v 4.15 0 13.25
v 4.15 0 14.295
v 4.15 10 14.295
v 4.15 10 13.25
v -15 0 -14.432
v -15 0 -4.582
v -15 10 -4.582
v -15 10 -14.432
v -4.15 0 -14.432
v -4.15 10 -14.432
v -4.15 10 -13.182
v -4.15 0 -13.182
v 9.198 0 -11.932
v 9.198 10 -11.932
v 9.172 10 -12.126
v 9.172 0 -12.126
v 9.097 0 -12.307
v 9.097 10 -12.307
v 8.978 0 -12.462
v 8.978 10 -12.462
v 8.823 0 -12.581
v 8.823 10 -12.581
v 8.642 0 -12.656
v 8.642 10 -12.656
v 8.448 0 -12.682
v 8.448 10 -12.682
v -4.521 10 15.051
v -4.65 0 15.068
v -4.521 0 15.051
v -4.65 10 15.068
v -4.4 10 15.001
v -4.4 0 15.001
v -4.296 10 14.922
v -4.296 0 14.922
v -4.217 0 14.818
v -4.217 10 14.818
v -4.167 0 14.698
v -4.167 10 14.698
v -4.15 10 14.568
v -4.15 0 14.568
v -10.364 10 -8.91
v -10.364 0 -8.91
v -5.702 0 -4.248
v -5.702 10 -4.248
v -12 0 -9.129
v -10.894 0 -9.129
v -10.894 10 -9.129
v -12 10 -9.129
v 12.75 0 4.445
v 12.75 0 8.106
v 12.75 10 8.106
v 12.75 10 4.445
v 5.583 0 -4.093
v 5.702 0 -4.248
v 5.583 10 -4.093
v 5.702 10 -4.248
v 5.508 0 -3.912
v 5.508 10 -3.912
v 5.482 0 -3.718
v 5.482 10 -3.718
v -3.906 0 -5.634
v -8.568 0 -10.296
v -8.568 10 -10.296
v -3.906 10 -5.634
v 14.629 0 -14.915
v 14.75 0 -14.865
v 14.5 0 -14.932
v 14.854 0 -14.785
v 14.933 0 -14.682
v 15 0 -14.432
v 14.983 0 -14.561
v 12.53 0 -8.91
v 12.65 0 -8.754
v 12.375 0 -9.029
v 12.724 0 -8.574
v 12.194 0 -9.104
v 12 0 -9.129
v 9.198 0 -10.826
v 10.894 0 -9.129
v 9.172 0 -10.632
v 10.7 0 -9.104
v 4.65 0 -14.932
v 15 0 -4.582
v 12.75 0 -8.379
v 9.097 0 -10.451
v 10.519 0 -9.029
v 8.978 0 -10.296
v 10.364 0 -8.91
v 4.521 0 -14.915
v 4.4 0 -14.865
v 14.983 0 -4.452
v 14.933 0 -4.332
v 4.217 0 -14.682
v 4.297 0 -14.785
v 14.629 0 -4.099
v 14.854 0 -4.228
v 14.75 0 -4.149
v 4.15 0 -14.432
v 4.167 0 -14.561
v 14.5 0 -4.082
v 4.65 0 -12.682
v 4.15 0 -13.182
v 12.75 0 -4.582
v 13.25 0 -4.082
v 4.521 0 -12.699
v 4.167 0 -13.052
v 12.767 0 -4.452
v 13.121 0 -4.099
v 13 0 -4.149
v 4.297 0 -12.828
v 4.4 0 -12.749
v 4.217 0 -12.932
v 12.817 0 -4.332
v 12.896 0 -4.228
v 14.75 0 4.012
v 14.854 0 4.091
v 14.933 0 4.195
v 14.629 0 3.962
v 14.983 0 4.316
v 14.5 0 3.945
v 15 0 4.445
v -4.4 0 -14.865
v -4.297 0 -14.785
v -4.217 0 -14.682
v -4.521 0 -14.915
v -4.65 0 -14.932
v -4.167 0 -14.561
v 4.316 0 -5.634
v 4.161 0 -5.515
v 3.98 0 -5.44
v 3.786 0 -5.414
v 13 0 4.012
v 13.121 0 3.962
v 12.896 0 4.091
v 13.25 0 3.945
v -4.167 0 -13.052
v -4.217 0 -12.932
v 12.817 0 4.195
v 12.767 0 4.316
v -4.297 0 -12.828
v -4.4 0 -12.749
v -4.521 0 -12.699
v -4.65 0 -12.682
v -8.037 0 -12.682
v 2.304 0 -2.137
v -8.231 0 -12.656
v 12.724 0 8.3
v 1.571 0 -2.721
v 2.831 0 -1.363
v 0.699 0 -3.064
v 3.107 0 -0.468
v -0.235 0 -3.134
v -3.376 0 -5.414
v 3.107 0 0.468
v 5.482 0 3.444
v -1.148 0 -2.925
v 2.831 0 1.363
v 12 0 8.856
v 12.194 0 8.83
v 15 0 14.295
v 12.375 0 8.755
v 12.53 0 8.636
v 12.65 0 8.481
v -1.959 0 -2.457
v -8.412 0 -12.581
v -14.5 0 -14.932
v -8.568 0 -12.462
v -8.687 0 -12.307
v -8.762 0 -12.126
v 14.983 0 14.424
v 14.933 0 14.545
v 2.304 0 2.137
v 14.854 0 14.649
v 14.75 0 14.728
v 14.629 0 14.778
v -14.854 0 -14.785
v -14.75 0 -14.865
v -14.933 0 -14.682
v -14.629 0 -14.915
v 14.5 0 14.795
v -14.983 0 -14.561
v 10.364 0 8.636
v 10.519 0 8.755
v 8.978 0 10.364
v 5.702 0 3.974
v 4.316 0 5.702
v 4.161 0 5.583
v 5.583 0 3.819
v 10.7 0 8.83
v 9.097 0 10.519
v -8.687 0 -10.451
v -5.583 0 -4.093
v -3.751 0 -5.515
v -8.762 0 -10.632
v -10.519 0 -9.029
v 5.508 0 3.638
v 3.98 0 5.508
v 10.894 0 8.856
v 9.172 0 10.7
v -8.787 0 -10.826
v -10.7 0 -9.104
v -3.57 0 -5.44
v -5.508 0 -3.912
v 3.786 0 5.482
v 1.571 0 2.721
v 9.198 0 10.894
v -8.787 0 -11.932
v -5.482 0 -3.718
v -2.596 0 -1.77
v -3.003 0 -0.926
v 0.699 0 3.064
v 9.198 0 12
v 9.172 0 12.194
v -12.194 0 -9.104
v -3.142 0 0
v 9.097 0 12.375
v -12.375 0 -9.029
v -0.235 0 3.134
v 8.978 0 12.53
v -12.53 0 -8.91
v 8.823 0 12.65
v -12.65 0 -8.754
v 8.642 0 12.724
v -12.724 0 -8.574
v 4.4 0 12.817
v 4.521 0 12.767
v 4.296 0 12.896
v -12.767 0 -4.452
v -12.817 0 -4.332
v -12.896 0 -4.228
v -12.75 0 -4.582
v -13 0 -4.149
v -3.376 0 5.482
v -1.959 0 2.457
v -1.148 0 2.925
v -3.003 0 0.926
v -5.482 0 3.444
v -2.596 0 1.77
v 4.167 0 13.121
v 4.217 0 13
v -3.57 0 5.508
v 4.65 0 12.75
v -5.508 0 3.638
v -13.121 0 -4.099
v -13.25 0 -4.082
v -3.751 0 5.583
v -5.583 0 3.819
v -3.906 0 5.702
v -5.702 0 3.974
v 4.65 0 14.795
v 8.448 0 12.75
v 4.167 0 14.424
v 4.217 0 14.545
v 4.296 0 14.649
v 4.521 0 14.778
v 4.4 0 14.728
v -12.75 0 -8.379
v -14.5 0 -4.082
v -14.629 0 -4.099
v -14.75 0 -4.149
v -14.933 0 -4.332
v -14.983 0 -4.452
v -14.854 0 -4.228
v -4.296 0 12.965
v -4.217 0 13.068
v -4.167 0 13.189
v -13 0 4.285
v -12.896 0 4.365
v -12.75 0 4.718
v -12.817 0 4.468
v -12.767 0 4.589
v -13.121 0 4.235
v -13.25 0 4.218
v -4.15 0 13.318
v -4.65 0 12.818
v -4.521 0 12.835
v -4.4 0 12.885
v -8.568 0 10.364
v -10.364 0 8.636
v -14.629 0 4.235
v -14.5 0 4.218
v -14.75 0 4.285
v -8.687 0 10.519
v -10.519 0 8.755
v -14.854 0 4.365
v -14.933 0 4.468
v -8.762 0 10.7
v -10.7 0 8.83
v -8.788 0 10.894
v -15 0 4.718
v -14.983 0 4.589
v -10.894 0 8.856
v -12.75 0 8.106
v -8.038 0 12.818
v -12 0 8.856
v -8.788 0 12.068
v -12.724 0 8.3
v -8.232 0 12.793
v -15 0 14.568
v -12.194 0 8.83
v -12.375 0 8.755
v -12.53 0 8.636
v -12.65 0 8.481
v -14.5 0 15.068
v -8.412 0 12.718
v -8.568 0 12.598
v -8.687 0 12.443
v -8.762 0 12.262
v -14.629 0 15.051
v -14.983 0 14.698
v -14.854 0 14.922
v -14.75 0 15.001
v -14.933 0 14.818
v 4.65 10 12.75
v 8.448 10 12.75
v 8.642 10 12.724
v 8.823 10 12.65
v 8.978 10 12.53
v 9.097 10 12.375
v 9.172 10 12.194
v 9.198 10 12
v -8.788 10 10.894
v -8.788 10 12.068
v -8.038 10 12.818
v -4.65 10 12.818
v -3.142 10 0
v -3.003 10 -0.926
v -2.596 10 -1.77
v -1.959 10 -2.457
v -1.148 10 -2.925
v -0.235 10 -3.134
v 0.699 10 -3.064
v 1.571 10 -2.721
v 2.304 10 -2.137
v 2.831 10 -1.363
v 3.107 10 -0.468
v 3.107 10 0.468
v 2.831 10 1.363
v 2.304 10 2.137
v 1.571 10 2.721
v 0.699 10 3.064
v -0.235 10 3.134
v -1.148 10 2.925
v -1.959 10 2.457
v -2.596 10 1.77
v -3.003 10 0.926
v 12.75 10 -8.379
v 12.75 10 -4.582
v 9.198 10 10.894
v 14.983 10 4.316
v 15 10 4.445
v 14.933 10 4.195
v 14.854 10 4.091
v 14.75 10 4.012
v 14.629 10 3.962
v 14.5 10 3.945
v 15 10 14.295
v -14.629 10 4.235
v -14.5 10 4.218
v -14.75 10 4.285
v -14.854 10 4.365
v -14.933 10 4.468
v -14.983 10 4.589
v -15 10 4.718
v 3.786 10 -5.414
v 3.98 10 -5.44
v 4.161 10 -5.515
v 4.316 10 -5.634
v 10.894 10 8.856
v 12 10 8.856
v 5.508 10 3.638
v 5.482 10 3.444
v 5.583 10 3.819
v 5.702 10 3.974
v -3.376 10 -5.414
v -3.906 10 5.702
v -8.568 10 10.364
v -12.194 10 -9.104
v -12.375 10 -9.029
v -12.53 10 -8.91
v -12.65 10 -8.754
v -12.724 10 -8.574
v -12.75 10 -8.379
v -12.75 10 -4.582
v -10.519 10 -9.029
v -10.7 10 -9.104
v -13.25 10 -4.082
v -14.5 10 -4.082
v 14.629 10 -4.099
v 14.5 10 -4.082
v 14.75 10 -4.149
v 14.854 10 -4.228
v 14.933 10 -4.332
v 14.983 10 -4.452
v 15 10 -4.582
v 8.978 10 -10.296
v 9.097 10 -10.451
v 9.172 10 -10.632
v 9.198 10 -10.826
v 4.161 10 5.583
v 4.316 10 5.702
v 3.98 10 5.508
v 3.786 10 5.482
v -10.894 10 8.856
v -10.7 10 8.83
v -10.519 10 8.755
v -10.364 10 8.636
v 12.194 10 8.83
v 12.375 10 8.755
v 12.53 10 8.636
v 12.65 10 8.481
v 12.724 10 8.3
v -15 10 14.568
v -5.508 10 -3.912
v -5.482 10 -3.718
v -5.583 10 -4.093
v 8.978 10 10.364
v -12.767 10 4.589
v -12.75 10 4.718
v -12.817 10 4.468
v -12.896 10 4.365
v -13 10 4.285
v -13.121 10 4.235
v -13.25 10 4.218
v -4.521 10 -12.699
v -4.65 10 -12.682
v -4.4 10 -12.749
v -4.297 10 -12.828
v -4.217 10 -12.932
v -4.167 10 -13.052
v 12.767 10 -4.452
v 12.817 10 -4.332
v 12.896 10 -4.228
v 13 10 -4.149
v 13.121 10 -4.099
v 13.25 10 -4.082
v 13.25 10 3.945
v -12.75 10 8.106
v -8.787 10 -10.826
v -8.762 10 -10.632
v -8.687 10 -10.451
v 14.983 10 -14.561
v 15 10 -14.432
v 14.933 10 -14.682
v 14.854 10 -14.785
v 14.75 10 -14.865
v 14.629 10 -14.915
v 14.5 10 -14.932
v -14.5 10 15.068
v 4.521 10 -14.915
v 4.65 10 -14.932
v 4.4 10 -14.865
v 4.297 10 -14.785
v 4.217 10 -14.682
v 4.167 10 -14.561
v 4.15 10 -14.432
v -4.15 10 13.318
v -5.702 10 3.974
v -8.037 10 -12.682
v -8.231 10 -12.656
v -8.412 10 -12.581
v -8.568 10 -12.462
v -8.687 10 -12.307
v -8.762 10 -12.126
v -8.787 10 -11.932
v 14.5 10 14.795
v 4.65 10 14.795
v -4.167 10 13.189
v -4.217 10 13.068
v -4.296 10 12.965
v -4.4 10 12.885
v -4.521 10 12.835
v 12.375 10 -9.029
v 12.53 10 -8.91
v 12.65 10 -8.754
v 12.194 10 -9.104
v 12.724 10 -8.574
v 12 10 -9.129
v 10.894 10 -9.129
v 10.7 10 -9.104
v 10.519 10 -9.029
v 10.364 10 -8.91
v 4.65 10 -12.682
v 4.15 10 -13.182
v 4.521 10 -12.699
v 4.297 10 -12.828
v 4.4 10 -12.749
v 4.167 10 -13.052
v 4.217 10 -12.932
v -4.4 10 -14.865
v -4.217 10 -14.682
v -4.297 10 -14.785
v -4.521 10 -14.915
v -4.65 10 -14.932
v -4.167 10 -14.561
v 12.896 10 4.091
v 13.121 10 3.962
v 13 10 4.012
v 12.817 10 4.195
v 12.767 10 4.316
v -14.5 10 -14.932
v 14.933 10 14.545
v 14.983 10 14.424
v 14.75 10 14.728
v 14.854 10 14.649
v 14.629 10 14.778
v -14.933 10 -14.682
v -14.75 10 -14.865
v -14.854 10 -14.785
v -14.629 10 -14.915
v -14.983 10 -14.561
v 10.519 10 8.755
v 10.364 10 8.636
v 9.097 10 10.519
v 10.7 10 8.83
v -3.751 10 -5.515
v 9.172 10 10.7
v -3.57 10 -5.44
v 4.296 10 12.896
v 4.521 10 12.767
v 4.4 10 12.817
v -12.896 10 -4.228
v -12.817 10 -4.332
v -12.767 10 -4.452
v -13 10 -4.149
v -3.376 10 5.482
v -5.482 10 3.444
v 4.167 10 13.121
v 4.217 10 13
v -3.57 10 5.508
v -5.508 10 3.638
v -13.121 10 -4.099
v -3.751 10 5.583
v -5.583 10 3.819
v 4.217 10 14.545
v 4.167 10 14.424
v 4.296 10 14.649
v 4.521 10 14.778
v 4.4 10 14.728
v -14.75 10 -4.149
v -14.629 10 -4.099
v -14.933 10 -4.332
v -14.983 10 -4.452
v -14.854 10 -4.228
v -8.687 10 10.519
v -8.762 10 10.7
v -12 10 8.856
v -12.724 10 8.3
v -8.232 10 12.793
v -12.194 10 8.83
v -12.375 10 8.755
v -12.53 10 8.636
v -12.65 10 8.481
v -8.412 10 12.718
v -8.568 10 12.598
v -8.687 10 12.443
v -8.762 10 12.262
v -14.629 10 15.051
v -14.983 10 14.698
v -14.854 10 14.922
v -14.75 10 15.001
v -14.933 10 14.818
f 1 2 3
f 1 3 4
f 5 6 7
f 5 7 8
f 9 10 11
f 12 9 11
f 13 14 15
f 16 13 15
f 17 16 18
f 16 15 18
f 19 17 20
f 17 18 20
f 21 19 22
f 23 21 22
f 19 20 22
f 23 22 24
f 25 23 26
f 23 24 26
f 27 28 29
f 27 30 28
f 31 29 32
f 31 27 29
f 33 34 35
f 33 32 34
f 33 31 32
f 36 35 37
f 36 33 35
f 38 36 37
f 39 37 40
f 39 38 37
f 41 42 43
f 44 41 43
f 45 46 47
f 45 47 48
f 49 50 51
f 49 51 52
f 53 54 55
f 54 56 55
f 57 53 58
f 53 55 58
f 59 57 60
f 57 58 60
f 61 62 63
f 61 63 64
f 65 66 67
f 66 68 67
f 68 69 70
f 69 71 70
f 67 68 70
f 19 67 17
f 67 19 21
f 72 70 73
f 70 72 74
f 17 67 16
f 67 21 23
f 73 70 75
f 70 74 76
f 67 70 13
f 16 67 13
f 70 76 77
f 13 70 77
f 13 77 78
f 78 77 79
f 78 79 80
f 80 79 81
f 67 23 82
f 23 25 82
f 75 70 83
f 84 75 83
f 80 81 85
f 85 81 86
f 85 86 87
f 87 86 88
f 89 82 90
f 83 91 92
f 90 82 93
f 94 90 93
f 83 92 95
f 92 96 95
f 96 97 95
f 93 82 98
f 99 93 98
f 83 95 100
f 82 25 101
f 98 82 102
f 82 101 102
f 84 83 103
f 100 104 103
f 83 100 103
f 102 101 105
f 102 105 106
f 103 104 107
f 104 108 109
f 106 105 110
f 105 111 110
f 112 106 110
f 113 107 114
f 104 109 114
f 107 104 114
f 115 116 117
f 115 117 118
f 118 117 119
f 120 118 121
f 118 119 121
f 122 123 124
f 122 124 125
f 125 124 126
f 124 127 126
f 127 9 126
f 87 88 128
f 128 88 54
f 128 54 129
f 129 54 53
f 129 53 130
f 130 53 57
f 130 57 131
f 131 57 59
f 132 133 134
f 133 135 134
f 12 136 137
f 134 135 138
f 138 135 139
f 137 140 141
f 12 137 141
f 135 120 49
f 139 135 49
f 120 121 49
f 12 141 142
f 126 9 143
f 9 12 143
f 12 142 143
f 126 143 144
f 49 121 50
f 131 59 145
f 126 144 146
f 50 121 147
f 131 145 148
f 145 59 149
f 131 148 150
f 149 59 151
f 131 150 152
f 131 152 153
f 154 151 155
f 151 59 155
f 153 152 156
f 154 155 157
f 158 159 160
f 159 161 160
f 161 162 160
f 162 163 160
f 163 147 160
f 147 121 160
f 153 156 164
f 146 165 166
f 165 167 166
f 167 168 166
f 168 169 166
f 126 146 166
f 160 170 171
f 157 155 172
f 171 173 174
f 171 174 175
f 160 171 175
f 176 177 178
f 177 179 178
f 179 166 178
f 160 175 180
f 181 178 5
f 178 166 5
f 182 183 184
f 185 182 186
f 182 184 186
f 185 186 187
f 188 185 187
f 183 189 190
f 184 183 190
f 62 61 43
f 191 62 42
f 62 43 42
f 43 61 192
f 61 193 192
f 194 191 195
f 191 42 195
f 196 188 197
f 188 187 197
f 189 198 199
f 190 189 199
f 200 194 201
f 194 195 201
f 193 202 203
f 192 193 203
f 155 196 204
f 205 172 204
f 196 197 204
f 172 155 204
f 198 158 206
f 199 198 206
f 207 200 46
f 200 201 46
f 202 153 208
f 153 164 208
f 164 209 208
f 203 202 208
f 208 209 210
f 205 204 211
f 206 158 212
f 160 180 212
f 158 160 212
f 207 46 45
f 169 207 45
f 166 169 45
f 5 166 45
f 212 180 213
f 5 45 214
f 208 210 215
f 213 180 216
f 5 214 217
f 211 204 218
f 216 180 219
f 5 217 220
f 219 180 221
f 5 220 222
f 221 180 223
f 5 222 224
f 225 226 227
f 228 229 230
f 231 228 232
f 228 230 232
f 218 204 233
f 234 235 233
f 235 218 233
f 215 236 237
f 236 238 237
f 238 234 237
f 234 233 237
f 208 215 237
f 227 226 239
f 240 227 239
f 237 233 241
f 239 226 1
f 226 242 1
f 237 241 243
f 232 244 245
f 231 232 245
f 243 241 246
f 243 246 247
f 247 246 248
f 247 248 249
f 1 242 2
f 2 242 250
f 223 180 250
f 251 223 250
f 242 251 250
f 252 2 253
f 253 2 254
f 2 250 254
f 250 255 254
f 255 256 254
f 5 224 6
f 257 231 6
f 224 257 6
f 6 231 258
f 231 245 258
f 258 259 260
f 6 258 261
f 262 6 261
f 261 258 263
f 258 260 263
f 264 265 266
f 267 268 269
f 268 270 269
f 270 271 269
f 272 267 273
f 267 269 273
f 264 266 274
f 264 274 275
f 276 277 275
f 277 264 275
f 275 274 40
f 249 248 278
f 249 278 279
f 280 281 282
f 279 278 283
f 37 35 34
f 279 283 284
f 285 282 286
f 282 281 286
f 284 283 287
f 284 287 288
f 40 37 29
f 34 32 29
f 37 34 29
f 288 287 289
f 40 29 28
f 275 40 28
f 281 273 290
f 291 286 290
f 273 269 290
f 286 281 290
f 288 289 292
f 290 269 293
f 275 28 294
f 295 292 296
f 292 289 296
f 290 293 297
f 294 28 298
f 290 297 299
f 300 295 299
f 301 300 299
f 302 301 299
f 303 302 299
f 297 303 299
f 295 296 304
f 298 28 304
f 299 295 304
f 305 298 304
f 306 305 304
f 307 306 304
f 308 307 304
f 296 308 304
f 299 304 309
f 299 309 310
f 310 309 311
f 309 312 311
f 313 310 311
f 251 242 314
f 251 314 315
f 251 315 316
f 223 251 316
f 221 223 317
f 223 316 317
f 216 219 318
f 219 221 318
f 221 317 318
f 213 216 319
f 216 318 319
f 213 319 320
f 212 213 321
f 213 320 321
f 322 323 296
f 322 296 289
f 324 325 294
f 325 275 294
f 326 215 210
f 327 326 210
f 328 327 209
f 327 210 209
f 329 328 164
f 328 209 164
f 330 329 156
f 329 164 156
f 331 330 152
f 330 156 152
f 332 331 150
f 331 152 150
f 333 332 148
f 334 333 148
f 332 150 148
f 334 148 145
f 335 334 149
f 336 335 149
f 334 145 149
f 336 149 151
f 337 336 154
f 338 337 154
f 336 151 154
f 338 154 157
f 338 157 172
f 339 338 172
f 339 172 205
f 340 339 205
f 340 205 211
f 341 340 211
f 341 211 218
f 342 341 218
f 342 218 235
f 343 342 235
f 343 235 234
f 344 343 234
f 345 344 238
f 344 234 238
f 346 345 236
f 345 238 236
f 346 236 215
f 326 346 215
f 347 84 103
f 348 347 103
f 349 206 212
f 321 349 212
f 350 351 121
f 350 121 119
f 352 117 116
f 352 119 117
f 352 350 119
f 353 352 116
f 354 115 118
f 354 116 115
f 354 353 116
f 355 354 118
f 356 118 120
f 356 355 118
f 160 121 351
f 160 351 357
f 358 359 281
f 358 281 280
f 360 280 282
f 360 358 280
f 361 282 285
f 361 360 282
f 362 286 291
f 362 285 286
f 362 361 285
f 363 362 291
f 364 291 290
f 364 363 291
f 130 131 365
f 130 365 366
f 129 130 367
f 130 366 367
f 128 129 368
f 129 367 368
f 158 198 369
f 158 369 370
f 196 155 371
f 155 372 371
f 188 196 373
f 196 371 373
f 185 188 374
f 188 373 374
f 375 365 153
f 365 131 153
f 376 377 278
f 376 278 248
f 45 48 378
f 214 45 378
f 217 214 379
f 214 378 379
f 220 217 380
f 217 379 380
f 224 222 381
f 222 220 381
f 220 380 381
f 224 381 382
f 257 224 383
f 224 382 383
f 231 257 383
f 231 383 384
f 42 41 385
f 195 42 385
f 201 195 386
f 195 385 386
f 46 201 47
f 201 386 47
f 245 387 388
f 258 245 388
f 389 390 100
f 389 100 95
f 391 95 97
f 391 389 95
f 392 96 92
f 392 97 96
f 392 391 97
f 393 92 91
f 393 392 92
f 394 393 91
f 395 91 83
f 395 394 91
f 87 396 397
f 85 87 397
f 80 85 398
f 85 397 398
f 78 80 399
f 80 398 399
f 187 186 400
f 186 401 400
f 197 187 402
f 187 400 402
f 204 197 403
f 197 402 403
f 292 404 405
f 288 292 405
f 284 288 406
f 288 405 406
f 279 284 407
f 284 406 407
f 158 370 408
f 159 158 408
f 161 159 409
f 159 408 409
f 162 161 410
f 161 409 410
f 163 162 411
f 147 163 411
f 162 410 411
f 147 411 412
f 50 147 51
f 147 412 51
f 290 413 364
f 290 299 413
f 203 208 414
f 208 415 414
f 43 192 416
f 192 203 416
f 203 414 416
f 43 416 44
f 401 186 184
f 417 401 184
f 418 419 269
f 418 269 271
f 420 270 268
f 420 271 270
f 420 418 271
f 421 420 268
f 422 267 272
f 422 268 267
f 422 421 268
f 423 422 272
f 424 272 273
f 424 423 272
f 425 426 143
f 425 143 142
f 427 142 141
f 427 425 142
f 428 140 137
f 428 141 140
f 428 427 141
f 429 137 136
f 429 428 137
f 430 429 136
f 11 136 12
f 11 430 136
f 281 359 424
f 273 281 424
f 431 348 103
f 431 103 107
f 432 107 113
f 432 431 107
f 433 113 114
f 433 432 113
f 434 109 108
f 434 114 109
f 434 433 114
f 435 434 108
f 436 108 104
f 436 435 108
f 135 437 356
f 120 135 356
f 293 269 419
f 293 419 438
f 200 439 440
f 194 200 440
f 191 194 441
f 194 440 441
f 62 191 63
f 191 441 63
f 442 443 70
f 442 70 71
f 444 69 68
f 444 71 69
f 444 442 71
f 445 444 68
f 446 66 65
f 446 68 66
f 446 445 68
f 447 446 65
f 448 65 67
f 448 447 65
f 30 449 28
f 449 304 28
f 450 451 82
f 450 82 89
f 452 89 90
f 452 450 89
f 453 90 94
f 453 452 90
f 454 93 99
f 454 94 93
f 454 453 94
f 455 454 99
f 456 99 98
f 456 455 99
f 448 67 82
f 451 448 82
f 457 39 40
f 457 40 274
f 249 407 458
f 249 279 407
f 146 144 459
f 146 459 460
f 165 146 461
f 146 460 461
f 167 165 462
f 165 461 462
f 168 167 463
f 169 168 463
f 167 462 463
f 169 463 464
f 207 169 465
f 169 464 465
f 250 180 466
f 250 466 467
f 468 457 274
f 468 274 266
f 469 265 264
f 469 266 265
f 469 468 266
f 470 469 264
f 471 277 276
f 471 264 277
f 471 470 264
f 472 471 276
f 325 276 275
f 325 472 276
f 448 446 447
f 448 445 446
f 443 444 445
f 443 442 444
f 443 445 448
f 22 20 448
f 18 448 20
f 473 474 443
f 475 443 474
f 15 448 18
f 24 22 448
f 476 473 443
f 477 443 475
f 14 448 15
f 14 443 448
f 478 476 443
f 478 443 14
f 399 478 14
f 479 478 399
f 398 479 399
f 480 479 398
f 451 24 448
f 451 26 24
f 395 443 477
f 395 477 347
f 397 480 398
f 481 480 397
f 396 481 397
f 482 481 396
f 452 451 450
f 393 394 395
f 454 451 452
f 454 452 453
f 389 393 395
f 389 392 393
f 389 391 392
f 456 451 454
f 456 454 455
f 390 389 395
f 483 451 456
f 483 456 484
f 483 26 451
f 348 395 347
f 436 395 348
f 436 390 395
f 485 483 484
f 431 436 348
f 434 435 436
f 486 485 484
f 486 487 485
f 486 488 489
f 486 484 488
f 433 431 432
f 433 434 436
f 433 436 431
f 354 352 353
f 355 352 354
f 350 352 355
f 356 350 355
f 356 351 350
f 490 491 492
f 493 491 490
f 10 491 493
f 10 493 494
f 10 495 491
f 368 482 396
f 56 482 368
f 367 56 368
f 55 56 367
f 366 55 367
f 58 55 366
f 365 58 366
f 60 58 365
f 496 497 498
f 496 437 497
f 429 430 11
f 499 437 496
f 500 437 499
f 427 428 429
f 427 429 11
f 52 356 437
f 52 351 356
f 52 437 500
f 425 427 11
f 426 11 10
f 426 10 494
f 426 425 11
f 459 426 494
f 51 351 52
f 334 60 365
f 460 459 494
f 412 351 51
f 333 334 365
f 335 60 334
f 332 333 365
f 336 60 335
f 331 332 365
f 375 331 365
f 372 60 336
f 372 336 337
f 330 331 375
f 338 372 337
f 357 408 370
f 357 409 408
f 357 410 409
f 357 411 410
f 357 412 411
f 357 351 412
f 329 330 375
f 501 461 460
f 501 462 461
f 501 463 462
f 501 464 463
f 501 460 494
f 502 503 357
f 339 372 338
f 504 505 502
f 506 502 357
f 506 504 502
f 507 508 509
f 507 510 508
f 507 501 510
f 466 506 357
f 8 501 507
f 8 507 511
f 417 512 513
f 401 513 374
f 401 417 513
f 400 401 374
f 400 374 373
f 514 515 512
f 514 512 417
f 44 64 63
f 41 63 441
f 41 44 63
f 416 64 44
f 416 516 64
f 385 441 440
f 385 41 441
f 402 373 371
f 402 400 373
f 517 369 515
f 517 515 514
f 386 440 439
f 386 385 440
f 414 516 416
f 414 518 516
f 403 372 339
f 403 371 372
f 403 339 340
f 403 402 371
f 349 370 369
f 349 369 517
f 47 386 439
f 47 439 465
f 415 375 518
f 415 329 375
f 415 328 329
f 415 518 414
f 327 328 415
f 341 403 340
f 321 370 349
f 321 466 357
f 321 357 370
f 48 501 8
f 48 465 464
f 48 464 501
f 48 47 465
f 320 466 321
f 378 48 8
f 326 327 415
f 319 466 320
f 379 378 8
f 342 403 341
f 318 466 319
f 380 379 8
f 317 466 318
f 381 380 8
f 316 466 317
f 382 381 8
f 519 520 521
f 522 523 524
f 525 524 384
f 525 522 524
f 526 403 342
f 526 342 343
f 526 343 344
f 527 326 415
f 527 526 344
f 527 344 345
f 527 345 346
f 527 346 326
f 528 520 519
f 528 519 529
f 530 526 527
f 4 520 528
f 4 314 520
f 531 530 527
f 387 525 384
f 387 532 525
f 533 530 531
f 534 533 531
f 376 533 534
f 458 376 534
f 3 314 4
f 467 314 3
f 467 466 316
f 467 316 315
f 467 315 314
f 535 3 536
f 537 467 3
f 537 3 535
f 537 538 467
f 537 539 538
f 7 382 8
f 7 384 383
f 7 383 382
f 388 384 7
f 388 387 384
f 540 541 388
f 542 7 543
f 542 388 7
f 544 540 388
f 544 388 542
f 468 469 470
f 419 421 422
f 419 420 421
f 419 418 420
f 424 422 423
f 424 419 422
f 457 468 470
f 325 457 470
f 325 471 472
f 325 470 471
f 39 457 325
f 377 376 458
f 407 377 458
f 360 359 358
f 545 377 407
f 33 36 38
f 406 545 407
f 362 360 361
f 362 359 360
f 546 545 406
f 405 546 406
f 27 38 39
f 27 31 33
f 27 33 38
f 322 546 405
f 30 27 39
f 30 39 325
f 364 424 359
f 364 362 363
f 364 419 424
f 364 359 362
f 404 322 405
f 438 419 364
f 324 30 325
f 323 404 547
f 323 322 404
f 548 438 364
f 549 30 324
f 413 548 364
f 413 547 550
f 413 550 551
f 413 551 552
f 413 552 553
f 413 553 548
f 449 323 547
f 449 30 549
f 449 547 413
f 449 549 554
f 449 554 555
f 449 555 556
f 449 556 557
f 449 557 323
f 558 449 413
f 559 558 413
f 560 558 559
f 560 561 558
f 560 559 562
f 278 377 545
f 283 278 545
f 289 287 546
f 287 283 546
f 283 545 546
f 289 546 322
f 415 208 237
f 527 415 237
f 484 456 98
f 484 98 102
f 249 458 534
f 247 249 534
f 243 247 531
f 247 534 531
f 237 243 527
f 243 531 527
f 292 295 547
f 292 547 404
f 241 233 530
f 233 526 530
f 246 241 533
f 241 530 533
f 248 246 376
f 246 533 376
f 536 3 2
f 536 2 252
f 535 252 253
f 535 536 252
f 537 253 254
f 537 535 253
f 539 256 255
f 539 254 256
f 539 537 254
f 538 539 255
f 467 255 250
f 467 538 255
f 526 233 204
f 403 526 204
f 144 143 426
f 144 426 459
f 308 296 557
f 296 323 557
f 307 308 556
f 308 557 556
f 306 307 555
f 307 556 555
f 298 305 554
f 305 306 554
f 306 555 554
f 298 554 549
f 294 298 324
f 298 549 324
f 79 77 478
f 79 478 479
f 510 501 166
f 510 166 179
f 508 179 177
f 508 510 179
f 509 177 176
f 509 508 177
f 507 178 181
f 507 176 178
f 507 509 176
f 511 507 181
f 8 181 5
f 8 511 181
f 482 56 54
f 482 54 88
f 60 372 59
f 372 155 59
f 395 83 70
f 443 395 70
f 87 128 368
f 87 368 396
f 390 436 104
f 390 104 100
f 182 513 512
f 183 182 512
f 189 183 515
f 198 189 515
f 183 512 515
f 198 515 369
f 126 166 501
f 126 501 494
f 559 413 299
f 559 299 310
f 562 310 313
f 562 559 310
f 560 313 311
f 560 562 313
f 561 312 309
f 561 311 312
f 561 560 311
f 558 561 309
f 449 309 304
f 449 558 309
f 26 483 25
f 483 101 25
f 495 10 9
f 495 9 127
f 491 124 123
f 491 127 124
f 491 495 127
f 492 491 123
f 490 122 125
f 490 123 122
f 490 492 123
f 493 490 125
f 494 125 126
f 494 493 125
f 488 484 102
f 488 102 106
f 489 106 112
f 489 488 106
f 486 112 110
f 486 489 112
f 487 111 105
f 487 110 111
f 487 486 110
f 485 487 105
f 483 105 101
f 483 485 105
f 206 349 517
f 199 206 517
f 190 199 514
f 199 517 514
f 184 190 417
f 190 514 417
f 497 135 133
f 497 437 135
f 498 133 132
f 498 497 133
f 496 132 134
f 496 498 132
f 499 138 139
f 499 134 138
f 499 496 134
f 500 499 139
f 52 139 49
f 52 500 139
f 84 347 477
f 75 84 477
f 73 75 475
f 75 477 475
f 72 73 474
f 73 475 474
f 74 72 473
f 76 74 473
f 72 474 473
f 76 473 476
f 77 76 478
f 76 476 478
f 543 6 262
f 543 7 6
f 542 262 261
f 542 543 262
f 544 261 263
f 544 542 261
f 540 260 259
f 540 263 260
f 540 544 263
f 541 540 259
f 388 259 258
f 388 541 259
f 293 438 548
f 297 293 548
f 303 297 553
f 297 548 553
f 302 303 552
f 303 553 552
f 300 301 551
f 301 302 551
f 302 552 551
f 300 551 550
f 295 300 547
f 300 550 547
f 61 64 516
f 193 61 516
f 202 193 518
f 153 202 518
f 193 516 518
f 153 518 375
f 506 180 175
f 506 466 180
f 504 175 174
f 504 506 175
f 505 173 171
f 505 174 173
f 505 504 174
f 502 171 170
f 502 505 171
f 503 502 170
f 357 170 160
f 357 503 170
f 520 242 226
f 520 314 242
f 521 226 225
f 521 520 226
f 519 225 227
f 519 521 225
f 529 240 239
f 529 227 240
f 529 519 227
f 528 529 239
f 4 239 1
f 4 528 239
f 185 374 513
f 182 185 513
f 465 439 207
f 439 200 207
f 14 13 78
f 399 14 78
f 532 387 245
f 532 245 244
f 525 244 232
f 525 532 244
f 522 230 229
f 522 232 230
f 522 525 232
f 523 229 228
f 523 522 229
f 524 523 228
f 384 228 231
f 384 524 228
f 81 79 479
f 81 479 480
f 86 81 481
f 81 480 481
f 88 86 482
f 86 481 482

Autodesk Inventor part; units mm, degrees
ref_plane "YZ Plane" through (0, 0, 0) normal (1, 0, 0) x (0, 1, 0)
ref_plane "XZ Plane" through (0, 0, 0) normal (0, 1, 0) x (-1, 0, 0)
ref_plane "XY Plane" through (0, 0, 0) normal (0, 0, 1) x (1, 0, 0)
sketch "Sketch1" plane through (0, 0, 0) normal (0, 1, 0) x (-1, 0, 0)
  line L0 (0, -21.0136) -> (0, 21.0817) projected
  line L1 (-21, 0) -> (21, 0) projected
  line L2 (21, 0) -> (-21, 0) projected
  line L3 (0, -21.0136) -> (0, 21.0817) projected
  line L4 (3.6865, 5.4825) -> (-4.0965, 5.4825)
  line L5 (-5.4825, 3.7546) -> (-5.4825, -4.0284)
  line L6 (-4.0967, -5.4144) -> (3.6863, -5.4144)
  line L7 (5.4825, -4.0284) -> (5.4825, 3.7546)
  line L8 (-5.4825, 5.4825) -> (5.4825, -5.4825) construction
  line L9 (15, 15.0681) -> (15, 4.2181)
  line L10 (15, 4.2181) -> (12.75, 4.2181)
  line L11 (15, 15.0681) -> (4.15, 15.0681)
  line L12 (4.15, 15.0681) -> (4.15, 12.8181)
  line L13 (-15, 14.795) -> (-4.15, 14.795)
  line L14 (-4.15, 14.795) -> (-4.15, 12.75)
  line L15 (-15, 12.75) -> (-15, 14.795)
  line L16 (-15, 14.795) -> (-12.75, 14.795)
  line L17 (-12.75, 3.945) -> (-15, 3.945)
  line L18 (-15, 3.945) -> (-15, 14.795)
  line L19 (-15, -14.9319) -> (-12.75, -14.9319)
  line L20 (-12.75, -4.0819) -> (-15, -4.0819)
  line L21 (-15, -4.0819) -> (-15, -14.9319)
  line L22 (-15, -14.9319) -> (-4.1502, -14.9319)
  line L23 (-4.1502, -14.9319) -> (-4.1502, -12.6819)
  line L24 (-15, -12.7481) -> (-15, -14.9319)
  line L25 (15, -14.9319) -> (12.75, -14.9319)
  line L26 (12.75, -4.0819) -> (15, -4.0819)
  line L27 (15, -4.0819) -> (15, -14.9319)
  line L28 (15, -14.9319) -> (4.1502, -14.9319)
  line L29 (4.1502, -14.9319) -> (4.1502, -12.6819)
  line L30 (15, -12.7481) -> (15, -14.9319)
  circle A0 centre (0, 0) radius 3.1425
  line L31 (8.9925, -14.9319) -> (4.1502, -14.9319)
  line L32 (-4.1502, -14.9319) -> (-8.9925, -14.9319)
  line L33 (15, -14.9319) -> (4.1502, -14.9319)
  line L34 (-4.1502, -14.9319) -> (-15, -14.9319)
  line L35 (15, -8.9925) -> (15, -4.0819)
  line L36 (15, 4.2181) -> (15, 9.0606)
  line L37 (15, 15.0681) -> (15, 4.2181)
  line L38 (15, -4.0819) -> (15, -14.9319)
  line L39 (-8.9925, 14.795) -> (-4.15, 14.795)
  line L40 (4.15, 15.0681) -> (8.9925, 15.0681)
  line L41 (-15, 14.795) -> (-4.15, 14.795)
  line L42 (4.15, 15.0681) -> (15, 15.0681)
  line L43 (-15, 8.9925) -> (-15, 3.945)
  line L44 (-15, -4.0819) -> (-15, -8.9925)
  line L45 (-15, -14.9319) -> (-15, -4.0819)
  line L46 (-15, 3.945) -> (-15, 14.795)
  line L47 (-4.1502, -12.6819) -> (-9.1977, -12.6819)
  line L48 (-12.75, -9.1294) -> (-12.75, -4.0819)
  line L49 (-12.75, -9.1294) -> (-10.5835, -9.1294)
  line L50 (-9.1977, -12.6819) -> (-9.1977, -10.5154)
  line L51 (-9.1975, 10.5835) -> (-9.1975, 12.75)
  line L52 (4.15, 12.8181) -> (8.7875, 12.8181)
  line L53 (12.75, 4.2181) -> (12.75, 8.8556)
  line L54 (12.75, 8.8556) -> (10.5835, 8.8556)
  line L55 (8.7875, 12.8181) -> (8.7875, 10.5835)
  line L56 (4.1502, -12.6819) -> (8.7873, -12.6819)
  line L57 (14.341, -12.7481) -> (15, -12.7481)
  line L58 (12.75, -14.9319) -> (12.75, -14.2729)
  line L59 (12.75, -9.1294) -> (12.75, -4.0819)
  line L60 (10.5835, -9.1294) -> (12.75, -9.1294)
  line L61 (8.7873, -10.5154) -> (8.7873, -12.6819)
  line L62 (5.4825, 5.4825) -> (-0.7955, -0.7955) construction
  line L63 (-2.2221, -2.2221) -> (-5.4825, -5.4825) construction
  line L64 (-12.75, 14.795) -> (-12.75, 14.136)
  line L65 (-12.75, 8.8556) -> (-12.75, 3.945)
  line L66 (-4.15, 12.75) -> (-9.1975, 12.75)
  line L67 (-14.341, 12.75) -> (-15, 12.75)
  line L68 (-10.5835, 8.8556) -> (-12.75, 8.8556)
  line L69 (-5.4825, 3.7546) -> (-10.5835, 8.8556)
  line L70 (-4.0965, 5.4825) -> (-9.1975, 10.5835)
  line L71 (8.7875, 10.5835) -> (3.6865, 5.4825)
  line L72 (10.5835, 8.8556) -> (5.4825, 3.7546)
  line L73 (10.5835, -9.1294) -> (5.4825, -4.0284)
  line L74 (8.7873, -10.5154) -> (3.6863, -5.4144)
  line L75 (-4.0967, -5.4144) -> (-9.1977, -10.5154)
  line L76 (-5.4825, -4.0284) -> (-10.5835, -9.1294)
  line L77 (15, 15) -> (-15, -15) construction
  line L78 (-15, 15) -> (15, -15) construction
  point P0 (-15, 0)
  dimension "d26" = 6.285
  dimension "d0" = 30
  dimension "d1" = 30
  dimension "d2" = 10.965
  dimension "d3" = 10.965
  dimension "d4" = 30
  dimension "d5" = 17.985
  dimension "d6" = 17.985
  dimension "d11" = 10.85
  dimension "d12" = 2.25
  dimension "d13" = 10.85
  dimension "d14" = 2.25
  dimension "d15" = 10.85
  dimension "d16" = 2.25
  dimension "d17" = 10.85
  dimension "d18" = 2.25
  dimension "d19" = 10.85
  dimension "d20" = 10.85
  dimension "d21" = 2.25
  dimension "d22" = 2.25
  dimension "d23" = 10.85
  dimension "d24" = 10.85
  dimension "d25" = 2.25
  dimension "d31" = 30
  dimension "d32" = 30
extrude "Extrusion1" add sketch "Sketch1" along normal blind 10 contours L6 L75 L50 L47 L23 L22 L19 L21 L20 L48 L49 L76 L5 L1 A0 L0 | L0 A0 L1 L7 L73 L60 L59 L26 L27 L25 L28 L29 L56 L61 L74 L6 | L1 L5 L69 L68 L65 L17 L18 L15 L13 L14 L66 L51 L70 L4 L0 A0 | A0 L0 L4 L71 L55 L52 L12 L11 L9 L10 L53 L54 L72 L7 L1
fillet "Fillet1" radius 0.5 20 edges at (15, 5, 14.795) (4.15, 5, 14.795) (-4.15, 5, 15.0681) (-4.15, 5, 12.8181) (15, 5, 3.945) (12.75, 5, 3.945) (15, 5, -4.0819) (12.75, 5, -4.0819) (15, 5, -14.9319) (4.1502, 5, -12.6819) (-4.1502, 5, -14.9319) (-4.1502, 5, -12.6819) (4.1502, 5, -14.9319) (-15, 5, -14.9319) (-12.75, 5, -4.0819) (-15, 5, -4.0819) (-12.75, 5, 4.2181) (-15, 5, 4.2181) (-15, 5, 15.0681) (4.15, 5, 12.75)
fillet "Fillet2" radius 0.75 24 edges at (-10.5835, 5, 8.8556) (-5.4825, 5, 3.7546) (-12.75, 5, -9.1294) (-10.5835, 5, -9.1294) (-8.7873, 5, -12.6819) (5.4825, 5, -4.0284) (10.5835, 5, -9.1294) (-3.6865, 5, 5.4825) (-8.7875, 5, 10.5835) (5.4825, 5, 3.7546) (10.5835, 5, 8.8556) (12.75, 5, 8.8556) (12.75, 5, -9.1294) (4.0965, 5, 5.4825) (9.1975, 5, 10.5835) (9.1975, 5, 12.75) (-8.7875, 5, 12.8181) (-12.75, 5, 8.8556) (4.0967, 5, -5.4144) (9.1977, 5, -10.5154) (9.1977, 5, -12.6819) (-8.7873, 5, -10.5154) (-3.6863, 5, -5.4144) (-5.4825, 5, -4.0284)
properties part number "Profile_iPart"
